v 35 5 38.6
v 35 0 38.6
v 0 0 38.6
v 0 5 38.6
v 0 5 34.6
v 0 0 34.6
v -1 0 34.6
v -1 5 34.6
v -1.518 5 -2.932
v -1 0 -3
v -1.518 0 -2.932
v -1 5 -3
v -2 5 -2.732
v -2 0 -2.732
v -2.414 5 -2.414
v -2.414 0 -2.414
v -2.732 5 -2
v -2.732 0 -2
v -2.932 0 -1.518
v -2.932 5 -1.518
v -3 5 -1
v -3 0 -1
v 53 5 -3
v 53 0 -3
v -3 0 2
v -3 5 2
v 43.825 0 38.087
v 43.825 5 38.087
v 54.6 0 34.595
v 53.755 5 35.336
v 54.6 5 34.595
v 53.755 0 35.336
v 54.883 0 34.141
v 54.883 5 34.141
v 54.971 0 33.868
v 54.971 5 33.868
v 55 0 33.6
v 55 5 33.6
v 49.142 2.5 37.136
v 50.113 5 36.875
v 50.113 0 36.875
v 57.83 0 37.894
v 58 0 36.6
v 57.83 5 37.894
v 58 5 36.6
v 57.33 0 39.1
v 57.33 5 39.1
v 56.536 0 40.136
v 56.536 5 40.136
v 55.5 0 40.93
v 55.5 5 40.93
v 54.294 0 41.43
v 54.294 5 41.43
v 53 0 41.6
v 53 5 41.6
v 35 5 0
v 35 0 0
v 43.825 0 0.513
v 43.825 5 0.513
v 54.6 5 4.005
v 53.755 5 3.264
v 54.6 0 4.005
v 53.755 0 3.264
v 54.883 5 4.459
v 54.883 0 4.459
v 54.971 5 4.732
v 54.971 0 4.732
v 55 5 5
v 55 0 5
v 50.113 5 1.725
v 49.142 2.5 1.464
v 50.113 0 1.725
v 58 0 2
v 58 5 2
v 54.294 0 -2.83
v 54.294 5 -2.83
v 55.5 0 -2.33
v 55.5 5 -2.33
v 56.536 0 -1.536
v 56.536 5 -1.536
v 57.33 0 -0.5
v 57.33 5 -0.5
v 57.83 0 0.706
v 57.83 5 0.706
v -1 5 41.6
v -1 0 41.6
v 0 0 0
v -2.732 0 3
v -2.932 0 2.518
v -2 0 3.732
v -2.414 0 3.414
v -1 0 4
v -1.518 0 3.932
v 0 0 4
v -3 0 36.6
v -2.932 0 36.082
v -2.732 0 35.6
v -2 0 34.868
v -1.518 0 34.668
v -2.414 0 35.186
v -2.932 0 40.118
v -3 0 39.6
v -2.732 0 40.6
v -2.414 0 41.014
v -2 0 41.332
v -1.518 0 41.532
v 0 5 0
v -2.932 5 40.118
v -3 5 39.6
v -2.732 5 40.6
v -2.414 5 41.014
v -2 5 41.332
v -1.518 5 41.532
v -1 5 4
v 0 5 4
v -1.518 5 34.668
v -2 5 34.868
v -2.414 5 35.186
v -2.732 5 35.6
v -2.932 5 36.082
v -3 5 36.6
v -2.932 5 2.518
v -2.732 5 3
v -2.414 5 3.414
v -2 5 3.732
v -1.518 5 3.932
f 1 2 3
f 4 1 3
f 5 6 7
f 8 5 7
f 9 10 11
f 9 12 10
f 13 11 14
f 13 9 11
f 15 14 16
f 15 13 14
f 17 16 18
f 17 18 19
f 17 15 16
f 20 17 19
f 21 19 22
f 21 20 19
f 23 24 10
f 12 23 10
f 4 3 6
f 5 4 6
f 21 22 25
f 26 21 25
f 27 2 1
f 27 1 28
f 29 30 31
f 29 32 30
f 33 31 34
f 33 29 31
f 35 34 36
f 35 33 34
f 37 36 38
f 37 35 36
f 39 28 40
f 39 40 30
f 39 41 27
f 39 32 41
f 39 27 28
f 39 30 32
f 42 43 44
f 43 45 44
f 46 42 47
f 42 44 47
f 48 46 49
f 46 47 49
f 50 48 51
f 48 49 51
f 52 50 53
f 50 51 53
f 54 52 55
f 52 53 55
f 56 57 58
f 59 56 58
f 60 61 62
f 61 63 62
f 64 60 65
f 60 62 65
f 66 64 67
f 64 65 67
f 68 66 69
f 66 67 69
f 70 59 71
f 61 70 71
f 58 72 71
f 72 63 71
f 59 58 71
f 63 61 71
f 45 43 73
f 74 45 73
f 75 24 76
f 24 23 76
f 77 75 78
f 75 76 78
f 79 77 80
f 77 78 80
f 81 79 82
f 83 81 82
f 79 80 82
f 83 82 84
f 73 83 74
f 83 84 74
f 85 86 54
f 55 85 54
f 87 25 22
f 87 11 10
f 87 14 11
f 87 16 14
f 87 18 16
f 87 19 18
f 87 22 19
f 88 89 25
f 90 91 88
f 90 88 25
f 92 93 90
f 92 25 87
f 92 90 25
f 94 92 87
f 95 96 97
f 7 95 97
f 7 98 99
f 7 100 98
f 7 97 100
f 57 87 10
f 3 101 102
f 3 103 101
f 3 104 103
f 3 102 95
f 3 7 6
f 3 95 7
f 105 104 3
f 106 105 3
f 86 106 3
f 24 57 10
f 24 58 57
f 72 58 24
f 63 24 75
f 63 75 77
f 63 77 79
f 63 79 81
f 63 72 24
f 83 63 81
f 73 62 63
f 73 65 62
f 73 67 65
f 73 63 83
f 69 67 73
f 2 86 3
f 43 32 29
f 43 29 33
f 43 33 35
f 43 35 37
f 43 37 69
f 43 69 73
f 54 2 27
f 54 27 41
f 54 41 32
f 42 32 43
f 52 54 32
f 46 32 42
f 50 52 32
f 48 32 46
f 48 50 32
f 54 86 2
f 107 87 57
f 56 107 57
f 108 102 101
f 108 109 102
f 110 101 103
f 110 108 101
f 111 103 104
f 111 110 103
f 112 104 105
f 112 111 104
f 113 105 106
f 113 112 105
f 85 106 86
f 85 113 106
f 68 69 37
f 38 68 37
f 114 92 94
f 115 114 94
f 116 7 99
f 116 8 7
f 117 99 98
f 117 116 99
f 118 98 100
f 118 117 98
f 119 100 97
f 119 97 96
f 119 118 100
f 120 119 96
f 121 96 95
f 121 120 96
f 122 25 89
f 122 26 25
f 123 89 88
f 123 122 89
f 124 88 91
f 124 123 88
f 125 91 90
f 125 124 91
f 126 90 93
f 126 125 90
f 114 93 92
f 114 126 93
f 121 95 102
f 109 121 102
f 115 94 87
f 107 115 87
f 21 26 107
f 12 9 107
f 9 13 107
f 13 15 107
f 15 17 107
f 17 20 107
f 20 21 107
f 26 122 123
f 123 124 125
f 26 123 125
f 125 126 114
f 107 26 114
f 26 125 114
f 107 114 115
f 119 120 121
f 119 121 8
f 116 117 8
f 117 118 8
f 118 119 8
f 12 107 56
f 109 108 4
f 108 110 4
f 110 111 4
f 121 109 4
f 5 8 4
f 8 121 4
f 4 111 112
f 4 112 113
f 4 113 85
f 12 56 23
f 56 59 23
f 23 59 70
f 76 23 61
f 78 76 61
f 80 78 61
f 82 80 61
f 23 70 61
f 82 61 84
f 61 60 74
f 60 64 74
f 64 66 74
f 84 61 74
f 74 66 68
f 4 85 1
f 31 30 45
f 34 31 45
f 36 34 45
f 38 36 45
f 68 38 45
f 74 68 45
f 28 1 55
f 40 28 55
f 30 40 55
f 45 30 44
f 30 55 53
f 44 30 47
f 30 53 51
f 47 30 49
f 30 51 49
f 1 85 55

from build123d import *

# Parameters (mm, degrees)
BOSS_EXTRUDE1_DEPTH = 5
FILLET1_SIZE        = 20
FILLET1_SIZE_2      = 5
FILLET2_R           = 2
FILLET3_R           = 5


with BuildPart() as part:
    # Sketch1 → Boss-Extrude1 (new body)
    with BuildSketch(Plane(origin=(0, 0, 0), x_dir=(1, 0, 0), z_dir=(0, 1, 0))):
        Polygon((0, 0), (55, 0), (55, -38.6), (0, -38.6), (0, -34.6), (-3, -34.6), (-3, -41.6), (1.5, -41.6), (58, -41.6), (58, 3), (0, 3), (-3, 3), (-3, -4), (0, -4), align=None)
    extrude(amount=BOSS_EXTRUDE1_DEPTH)

    # Fillet1
    # an asymmetric fillet: 20, 5 mm, written as the material it adds along each edge
    with BuildSketch(Plane(origin=(55, 0, 0), x_dir=(-1, 0, 0), z_dir=(0, 1, 0))) as fillet1_piece_1:
        with BuildLine():
            Bezier((FILLET1_SIZE, 0), (0, 0), (0, FILLET1_SIZE_2), weights=[1, 0.707106781, 1])
            Line((0, FILLET1_SIZE_2), (0, 0))
            Line((0, 0), (FILLET1_SIZE, 0))
        make_face()
    extrude(amount=5)
    with BuildSketch(Plane(origin=(55, 0, 38.6), x_dir=(-1, 0, 0), z_dir=(0, 1, 0))) as fillet1_piece_2:
        with BuildLine():
            Bezier((FILLET1_SIZE, 0), (0, 0), (0, -FILLET1_SIZE_2), weights=[1, 0.707106781, 1])
            Line((0, -FILLET1_SIZE_2), (0, 0))
            Line((0, 0), (FILLET1_SIZE, 0))
        make_face()
    extrude(amount=5)

    # Fillet2
    fillet2_edges = [part.edges().sort_by_distance(p)[0] for p in [
        (-3, 2.5, 4),
        (-3, 2.5, -3),
        (-3, 2.5, 41.6),
        (-3, 2.5, 34.6),
    ]]
    fillet(fillet2_edges, radius=FILLET2_R)

    # Fillet3
    fillet3_edges = [part.edges().sort_by_distance(p)[0] for p in [
        (58, 2.5, -3),
        (58, 2.5, 41.6),
    ]]
    fillet(fillet3_edges, radius=FILLET3_R)


solid = part.part
